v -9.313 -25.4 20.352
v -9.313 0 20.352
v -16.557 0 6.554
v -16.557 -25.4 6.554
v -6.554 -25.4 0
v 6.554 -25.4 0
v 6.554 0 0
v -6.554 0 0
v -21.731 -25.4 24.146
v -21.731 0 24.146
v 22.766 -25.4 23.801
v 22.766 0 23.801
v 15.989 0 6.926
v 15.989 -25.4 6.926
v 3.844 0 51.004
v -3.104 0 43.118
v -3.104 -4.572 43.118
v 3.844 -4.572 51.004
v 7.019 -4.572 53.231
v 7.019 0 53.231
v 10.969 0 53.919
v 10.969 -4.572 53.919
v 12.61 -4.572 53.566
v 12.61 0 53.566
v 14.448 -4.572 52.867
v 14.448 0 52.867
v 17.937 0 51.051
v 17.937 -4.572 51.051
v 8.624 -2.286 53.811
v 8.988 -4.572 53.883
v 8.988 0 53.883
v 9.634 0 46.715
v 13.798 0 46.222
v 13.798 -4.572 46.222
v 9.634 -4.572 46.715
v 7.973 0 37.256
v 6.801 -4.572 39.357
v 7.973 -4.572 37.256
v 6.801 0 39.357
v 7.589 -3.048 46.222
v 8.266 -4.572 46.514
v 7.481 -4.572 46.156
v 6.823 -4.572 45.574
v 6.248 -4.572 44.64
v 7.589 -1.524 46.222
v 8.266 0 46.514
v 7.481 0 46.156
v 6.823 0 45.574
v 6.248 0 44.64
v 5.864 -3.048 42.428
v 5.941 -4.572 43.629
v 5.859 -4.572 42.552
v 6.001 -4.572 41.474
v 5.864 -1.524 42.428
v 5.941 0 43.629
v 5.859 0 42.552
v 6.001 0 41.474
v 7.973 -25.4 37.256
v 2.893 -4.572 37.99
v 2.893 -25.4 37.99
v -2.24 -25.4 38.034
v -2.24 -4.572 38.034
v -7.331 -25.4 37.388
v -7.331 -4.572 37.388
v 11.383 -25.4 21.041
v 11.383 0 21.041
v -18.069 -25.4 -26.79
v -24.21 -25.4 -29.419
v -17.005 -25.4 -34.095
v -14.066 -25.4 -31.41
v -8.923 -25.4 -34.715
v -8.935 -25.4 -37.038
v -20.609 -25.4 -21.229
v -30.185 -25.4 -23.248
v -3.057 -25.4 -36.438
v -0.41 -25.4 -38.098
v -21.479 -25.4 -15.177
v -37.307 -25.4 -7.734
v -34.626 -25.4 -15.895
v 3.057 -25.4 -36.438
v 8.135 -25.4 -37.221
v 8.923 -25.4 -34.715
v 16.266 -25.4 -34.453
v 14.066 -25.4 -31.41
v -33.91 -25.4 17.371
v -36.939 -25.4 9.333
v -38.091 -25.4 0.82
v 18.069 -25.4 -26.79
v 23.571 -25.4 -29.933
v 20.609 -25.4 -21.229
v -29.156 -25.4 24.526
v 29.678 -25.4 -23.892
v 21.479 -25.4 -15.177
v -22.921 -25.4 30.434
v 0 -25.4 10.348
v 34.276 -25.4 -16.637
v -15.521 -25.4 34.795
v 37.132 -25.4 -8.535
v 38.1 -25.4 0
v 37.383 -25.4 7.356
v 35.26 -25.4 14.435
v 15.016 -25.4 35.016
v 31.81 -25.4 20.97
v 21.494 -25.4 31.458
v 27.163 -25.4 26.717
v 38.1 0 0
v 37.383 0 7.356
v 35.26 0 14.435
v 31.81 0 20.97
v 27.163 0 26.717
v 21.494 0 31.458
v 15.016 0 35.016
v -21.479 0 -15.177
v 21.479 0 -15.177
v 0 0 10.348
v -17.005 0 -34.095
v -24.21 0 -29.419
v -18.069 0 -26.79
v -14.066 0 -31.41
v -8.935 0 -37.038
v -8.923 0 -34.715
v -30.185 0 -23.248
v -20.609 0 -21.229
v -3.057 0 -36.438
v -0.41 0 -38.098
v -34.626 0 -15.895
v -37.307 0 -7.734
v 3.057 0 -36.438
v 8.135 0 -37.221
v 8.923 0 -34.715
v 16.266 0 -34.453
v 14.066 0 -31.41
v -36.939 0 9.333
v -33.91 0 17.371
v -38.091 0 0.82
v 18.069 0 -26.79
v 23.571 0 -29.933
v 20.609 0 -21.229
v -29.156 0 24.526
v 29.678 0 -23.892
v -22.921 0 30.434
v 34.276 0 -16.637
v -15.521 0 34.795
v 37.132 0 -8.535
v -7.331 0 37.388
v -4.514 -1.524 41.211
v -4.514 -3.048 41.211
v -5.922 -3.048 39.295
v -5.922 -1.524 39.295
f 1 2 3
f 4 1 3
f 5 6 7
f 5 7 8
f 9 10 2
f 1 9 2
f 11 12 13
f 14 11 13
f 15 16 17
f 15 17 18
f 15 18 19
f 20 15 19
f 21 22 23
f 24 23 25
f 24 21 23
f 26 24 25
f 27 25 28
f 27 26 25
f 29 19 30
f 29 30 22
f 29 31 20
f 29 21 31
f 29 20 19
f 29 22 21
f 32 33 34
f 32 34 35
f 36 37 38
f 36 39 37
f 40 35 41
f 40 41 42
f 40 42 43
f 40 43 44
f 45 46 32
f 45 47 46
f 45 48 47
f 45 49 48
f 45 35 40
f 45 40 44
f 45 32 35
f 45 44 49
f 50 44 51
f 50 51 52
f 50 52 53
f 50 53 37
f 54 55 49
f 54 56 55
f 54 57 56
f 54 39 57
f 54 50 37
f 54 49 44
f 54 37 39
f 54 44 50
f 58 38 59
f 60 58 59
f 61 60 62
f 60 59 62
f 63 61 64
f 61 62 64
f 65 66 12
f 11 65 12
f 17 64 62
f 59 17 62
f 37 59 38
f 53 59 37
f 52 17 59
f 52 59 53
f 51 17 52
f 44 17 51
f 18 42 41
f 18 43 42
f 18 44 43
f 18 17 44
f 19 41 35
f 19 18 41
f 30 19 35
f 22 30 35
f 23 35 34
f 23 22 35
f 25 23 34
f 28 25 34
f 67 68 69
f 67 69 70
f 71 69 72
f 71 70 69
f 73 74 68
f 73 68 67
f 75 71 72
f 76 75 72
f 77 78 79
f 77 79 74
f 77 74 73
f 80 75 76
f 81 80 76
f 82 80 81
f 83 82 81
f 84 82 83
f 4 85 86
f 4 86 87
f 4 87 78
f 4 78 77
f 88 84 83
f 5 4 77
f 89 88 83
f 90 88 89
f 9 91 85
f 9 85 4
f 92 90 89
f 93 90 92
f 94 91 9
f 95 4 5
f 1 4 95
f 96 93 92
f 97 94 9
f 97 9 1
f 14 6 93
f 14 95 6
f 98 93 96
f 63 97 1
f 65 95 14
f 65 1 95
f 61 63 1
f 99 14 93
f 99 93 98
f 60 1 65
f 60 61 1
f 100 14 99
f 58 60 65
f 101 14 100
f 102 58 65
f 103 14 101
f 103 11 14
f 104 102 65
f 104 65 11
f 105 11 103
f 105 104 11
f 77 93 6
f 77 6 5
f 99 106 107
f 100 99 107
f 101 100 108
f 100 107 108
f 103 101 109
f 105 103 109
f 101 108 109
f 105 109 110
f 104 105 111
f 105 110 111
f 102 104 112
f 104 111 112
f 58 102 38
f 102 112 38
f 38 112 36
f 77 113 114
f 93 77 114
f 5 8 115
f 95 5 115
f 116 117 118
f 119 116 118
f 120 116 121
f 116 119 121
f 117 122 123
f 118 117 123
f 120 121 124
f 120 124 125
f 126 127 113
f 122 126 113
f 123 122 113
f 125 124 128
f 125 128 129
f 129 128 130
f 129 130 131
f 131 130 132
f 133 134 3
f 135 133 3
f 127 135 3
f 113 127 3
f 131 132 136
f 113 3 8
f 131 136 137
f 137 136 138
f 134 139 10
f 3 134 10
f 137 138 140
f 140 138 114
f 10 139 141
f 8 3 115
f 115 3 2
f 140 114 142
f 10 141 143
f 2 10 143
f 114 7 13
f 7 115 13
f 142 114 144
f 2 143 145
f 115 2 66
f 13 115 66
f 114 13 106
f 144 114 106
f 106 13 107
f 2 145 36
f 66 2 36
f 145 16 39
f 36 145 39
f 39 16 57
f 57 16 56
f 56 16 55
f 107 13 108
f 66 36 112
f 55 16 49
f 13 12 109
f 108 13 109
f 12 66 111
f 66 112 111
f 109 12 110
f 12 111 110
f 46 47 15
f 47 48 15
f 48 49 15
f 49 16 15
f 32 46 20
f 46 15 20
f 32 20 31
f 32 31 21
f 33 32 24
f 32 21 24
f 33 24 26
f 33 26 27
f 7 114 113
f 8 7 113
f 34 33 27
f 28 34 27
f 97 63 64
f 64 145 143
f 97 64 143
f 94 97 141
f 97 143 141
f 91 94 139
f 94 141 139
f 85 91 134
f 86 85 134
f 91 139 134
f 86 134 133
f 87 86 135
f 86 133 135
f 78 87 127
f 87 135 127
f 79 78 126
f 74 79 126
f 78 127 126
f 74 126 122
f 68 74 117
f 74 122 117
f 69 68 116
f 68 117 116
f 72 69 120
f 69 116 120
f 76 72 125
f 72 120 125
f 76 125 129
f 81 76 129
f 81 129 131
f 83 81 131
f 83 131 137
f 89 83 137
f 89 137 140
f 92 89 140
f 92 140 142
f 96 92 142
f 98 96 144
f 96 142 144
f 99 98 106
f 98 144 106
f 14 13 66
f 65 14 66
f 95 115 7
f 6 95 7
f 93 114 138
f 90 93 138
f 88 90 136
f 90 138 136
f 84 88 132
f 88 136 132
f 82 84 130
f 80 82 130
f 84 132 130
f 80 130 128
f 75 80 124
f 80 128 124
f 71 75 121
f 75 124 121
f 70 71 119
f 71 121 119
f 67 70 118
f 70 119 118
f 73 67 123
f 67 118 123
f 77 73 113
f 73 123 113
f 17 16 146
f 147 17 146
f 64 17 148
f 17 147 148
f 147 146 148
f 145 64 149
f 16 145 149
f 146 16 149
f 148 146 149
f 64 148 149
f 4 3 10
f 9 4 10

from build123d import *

# Parameters (mm, degrees)
F1_DEPTH = 25.4
F2_DEPTH = 4.572


with BuildPart() as f1:
    # F0 (on Front) → F1 (new body)
    with BuildSketch(Plane.XZ):
        with BuildLine():
            ThreePointArc((-7.3314444091, 37.387964947), (-24.2103486965, -29.4188547703), (38.1, 0))
            ThreePointArc((38.1, 0), (29.6258643924, 23.956589052), (7.9730625194, 37.2564125227))
            ThreePointArc((7.9730625194, 37.2564125227), (0.3274827628, 38.0985925598), (-7.3314444091, 37.387964947))
        make_face()
        with BuildLine():
            ThreePointArc((21.4790297282, -15.1774131634), (0, -36.6564428916), (-21.4790297282, -15.1774131634))
            Line((-21.4790297282, -15.1774131634), (21.4790297282, -15.1774131634))
        make_face(mode=Mode.SUBTRACT)
        Polygon((-6.5538821451, 0), (0, 10.348235436), (6.5538832613, 0), align=None, mode=Mode.SUBTRACT)
        Polygon((-16.5571787067, 6.5538827032), (-21.7312953085, 24.1458841722), (-9.3134132318, 20.3515308814), align=None, mode=Mode.SUBTRACT)
        Polygon((15.9893649439, 6.9261599984), (11.3830587563, 21.0414130949), (22.7661197451, 23.8009441816), align=None, mode=Mode.SUBTRACT)
    extrude(amount=F1_DEPTH)

    # F0 (on Front) → F2 (join)
    with BuildSketch(Plane.XZ):
        with BuildLine():
            ThreePointArc((-7.3314444091, 37.387964947), (0.3274827628, 38.0985925598), (7.9730625194, 37.2564125227))
            add(Edge.make_bspline(
                [(13.7976465038, 46.2221194713), (11.4257742807, 46.6512124753), (7.1192413466, 47.4336244295), (5.0852564917, 42.1322478947), (6.9696530621, 38.9708554427), (7.9730625194, 37.2564125227)],
                knots=[0, 0, 0, 0, 0.361306556, 0.6573311923, 1, 1, 1, 1], degree=3))
            Line((13.7976465038, 46.2221194713), (17.9369442501, 51.0512971987))
            add(Edge.make_bspline(
                [(-3.1044713563, 43.1176461616), (0.7883330685, 48.011810346), (7.7265818936, 56.7348092941), (14.8223562753, 52.7850063276), (17.9369442501, 51.0512971987)],
                knots=[0, 0, 0, 0, 0.5610644015, 1, 1, 1, 1], degree=3))
            add(Edge.make_bspline(
                [(-3.1044713563, 43.1176461616), (-4.5159470278, 41.2204233442), (-5.9199687377, 39.2851877643), (-7.3314444091, 37.387964947)],
                knots=[0, 0, 0, 0, 7.1201508418, 7.1201508418, 7.1201508418, 7.1201508418], degree=3))
        make_face()
    extrude(amount=F2_DEPTH)


solid = f1.part
